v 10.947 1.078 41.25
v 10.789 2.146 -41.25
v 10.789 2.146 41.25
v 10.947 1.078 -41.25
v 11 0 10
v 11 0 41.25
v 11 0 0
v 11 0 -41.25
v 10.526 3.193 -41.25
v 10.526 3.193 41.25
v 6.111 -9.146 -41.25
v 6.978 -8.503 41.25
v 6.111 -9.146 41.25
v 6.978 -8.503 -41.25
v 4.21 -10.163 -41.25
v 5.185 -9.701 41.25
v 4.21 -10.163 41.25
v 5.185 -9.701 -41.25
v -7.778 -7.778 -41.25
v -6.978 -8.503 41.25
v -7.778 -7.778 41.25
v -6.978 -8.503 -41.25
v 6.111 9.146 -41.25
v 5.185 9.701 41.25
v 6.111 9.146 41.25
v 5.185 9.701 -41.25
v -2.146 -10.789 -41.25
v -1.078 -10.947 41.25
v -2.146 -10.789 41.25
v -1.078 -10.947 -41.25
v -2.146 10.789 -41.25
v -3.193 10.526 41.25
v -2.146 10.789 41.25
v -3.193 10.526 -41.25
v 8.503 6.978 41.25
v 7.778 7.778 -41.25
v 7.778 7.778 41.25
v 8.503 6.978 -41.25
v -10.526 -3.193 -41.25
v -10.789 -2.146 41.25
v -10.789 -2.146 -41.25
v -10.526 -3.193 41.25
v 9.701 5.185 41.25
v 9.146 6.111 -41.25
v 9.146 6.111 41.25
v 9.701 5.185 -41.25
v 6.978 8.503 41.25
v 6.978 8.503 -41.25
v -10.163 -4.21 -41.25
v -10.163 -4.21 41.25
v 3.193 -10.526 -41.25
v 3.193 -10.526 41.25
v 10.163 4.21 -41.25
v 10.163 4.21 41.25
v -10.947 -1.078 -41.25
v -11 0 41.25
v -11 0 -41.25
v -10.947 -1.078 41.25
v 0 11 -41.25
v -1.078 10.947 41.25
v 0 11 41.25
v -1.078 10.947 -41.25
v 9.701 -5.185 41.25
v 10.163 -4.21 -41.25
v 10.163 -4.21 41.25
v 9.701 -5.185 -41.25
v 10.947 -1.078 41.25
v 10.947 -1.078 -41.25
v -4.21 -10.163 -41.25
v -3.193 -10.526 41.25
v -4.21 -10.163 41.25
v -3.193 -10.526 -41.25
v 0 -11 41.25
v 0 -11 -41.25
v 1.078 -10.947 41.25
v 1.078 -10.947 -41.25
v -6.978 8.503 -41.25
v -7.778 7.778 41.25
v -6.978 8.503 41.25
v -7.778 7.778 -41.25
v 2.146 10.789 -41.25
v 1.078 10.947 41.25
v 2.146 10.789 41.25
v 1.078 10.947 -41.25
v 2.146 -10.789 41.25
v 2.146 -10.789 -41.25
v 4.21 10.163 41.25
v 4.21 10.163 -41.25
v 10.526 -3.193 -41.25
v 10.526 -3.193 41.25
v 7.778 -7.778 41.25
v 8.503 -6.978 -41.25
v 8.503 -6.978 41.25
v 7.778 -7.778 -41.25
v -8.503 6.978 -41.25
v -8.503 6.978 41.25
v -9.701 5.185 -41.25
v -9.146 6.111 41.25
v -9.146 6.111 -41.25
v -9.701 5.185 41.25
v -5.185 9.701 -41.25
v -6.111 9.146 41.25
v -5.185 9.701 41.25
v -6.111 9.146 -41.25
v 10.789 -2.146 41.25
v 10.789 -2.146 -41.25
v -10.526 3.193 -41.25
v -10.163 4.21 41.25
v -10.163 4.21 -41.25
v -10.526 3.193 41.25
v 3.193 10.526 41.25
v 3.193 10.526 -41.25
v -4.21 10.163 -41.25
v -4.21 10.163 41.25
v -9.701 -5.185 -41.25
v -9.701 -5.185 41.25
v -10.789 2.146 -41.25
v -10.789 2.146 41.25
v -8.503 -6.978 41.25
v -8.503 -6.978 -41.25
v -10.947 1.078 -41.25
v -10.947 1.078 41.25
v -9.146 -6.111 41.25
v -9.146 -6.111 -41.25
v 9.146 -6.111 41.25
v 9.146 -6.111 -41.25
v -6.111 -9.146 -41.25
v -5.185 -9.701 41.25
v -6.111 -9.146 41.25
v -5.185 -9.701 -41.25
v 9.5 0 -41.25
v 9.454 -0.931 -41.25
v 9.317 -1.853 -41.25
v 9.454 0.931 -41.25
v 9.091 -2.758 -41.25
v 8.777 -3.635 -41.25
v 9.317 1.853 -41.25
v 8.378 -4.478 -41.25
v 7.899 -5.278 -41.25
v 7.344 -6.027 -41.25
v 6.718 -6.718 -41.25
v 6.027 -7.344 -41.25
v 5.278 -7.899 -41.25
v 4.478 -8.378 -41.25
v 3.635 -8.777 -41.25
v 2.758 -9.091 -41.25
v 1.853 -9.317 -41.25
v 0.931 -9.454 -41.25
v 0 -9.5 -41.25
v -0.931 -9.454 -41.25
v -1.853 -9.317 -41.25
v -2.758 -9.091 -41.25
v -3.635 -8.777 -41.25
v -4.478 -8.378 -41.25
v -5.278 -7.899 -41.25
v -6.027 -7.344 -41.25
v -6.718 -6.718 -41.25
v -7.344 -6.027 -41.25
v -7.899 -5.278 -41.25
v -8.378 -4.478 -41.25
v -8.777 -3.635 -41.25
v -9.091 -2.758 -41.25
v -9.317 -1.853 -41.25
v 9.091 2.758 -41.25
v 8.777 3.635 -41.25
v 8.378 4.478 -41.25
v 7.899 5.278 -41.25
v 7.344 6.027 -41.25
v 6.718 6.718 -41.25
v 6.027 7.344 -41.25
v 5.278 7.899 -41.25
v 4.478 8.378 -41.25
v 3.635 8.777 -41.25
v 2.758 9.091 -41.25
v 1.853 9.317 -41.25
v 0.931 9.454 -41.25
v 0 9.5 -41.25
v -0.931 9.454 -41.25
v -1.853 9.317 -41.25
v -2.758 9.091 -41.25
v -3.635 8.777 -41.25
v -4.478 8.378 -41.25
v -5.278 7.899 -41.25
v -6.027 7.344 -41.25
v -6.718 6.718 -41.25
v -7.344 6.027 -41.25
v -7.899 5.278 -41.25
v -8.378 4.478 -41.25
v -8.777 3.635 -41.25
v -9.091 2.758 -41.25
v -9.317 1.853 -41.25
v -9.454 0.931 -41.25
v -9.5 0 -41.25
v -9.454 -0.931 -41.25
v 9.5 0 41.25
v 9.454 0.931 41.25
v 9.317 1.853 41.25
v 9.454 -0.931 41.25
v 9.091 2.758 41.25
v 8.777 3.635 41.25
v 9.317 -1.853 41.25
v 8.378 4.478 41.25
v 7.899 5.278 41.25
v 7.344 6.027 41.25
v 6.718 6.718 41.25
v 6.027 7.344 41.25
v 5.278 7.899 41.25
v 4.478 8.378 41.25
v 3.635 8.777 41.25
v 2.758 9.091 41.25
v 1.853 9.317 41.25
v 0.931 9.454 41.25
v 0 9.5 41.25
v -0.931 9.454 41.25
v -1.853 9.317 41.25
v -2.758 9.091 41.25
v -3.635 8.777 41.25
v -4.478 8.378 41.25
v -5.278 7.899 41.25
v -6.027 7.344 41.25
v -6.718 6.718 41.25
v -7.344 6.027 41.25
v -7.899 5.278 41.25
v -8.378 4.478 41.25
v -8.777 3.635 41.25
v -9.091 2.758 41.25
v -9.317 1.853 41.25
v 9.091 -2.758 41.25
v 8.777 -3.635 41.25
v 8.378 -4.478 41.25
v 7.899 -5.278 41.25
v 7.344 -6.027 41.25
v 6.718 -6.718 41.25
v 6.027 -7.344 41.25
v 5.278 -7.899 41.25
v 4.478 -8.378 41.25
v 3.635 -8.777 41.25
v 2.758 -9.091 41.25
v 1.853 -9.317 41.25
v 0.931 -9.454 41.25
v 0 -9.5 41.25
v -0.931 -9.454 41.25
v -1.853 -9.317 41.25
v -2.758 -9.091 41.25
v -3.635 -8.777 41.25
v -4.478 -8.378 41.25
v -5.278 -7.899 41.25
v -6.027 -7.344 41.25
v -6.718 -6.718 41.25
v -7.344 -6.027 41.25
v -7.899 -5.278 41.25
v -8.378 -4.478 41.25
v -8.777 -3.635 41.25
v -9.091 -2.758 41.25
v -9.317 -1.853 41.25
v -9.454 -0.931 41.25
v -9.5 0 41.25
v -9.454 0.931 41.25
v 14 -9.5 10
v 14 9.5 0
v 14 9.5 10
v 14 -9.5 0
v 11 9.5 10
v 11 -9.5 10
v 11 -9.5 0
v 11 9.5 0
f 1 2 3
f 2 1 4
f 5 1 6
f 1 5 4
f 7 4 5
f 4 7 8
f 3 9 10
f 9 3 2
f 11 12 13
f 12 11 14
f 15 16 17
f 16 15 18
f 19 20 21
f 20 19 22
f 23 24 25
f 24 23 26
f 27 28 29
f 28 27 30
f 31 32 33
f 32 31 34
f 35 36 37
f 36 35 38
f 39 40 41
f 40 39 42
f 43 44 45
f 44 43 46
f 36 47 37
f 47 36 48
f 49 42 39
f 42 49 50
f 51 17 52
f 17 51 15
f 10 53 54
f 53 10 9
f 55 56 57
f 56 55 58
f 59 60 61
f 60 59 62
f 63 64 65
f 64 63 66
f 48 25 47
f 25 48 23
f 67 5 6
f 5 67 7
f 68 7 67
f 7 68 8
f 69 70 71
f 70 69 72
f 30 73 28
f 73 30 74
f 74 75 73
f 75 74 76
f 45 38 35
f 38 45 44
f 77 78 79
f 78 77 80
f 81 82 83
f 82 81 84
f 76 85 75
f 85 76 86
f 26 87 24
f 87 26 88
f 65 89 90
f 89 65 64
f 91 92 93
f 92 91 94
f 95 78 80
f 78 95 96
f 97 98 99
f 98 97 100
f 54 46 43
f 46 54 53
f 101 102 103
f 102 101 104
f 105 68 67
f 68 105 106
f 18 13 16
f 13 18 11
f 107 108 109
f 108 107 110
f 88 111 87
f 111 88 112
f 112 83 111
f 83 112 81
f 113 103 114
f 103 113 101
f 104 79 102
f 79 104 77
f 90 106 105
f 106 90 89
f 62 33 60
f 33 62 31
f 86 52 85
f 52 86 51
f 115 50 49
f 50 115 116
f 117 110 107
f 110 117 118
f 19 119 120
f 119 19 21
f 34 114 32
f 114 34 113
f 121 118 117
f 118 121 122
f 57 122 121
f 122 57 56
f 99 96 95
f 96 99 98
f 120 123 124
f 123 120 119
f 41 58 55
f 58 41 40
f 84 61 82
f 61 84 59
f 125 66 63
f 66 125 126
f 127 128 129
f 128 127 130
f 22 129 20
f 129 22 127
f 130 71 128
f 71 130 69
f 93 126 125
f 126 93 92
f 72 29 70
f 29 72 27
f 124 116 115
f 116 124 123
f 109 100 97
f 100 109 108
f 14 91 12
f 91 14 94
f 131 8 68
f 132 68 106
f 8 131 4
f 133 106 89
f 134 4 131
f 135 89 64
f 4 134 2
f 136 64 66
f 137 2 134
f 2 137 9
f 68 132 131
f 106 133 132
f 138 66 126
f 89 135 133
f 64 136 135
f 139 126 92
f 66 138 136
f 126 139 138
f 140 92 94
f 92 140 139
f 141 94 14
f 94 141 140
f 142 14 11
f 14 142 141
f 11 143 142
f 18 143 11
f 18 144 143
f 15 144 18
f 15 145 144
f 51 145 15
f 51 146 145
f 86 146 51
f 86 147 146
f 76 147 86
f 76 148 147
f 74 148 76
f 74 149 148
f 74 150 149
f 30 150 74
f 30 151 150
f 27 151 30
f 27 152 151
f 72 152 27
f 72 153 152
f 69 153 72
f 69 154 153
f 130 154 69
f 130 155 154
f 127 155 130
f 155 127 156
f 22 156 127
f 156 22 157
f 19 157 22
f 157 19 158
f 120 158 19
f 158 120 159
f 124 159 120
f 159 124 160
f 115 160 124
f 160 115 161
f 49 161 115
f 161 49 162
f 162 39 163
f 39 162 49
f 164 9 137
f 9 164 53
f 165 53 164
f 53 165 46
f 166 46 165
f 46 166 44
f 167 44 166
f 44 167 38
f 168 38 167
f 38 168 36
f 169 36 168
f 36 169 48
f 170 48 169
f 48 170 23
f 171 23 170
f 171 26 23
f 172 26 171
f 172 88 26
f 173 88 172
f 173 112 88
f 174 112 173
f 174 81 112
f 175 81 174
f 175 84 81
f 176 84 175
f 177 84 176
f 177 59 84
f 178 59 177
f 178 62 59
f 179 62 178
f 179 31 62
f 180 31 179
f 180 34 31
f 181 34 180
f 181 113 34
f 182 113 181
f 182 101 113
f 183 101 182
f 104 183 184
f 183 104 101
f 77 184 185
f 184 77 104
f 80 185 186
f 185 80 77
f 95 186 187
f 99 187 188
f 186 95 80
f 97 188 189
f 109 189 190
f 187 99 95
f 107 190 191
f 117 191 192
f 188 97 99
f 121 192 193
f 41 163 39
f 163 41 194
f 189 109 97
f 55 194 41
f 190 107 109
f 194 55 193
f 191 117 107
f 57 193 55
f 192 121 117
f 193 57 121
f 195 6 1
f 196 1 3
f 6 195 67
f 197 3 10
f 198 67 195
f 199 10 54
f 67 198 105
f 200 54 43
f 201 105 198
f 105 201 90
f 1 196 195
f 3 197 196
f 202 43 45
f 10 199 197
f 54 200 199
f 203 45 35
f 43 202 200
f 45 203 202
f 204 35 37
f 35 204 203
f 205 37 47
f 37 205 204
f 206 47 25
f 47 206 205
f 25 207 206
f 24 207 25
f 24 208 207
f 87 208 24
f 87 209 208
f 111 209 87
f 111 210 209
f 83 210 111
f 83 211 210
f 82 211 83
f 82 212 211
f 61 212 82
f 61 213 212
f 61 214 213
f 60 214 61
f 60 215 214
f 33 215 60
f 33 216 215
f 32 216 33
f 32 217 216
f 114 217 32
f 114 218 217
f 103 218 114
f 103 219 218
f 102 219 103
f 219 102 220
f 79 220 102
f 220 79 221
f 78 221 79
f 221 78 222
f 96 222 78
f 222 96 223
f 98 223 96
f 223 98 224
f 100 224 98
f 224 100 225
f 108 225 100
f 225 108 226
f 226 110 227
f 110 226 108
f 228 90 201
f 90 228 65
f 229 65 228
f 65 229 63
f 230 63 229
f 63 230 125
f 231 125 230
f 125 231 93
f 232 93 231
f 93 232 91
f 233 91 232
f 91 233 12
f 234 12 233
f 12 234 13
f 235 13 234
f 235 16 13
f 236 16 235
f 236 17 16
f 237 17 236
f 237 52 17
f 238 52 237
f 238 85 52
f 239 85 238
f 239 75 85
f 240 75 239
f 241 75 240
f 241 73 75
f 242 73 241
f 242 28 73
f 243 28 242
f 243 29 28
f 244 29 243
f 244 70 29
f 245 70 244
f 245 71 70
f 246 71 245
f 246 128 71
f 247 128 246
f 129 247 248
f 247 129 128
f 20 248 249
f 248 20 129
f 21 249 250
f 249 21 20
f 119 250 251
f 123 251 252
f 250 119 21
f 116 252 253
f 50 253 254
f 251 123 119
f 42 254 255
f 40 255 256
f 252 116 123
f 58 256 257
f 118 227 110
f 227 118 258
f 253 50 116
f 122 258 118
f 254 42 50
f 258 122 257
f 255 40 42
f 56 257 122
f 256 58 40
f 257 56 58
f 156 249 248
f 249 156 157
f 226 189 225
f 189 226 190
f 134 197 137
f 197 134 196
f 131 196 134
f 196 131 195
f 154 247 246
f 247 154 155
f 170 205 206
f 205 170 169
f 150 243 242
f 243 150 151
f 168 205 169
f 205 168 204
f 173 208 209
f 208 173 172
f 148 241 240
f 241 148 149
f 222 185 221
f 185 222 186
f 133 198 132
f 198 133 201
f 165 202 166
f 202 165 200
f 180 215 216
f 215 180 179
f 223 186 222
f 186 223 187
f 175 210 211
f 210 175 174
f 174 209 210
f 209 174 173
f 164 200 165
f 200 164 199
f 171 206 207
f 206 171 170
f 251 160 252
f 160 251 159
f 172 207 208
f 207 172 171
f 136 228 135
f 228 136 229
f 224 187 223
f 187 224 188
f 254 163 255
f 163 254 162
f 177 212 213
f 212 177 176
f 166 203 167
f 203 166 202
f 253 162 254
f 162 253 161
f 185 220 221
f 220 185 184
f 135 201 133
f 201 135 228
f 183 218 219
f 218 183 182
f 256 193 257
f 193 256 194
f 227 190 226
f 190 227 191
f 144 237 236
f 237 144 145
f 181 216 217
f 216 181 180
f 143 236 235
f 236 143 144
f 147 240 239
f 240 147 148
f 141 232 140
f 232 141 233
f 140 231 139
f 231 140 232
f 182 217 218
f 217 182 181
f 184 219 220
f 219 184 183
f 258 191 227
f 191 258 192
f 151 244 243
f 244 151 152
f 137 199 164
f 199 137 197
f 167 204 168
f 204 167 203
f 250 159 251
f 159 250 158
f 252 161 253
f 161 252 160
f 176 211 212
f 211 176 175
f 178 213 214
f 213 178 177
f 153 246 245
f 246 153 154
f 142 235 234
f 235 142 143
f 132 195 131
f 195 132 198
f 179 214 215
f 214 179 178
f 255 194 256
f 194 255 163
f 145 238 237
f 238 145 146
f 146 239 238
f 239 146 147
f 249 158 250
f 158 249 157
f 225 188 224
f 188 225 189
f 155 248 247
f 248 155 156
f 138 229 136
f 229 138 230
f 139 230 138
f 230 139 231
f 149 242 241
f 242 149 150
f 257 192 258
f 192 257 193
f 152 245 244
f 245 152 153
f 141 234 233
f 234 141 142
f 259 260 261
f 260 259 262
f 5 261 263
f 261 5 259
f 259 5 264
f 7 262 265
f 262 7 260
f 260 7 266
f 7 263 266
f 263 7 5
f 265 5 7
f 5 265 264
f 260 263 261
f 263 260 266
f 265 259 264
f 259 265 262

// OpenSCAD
module hollow_cylindrical_ring() {
    difference() {
        // Outer cylinder
        cylinder(h=82.5, r=11, $fn=64);
        // Inner cylinder (bore)
        translate([0, 0, -1])
            cylinder(h=84.5, r=9.5, $fn=64);
    }
}

module rectangular_lug() {
    translate([11, -9.5, 41.25])
        cube([3, 19, 10], center=false);
}

translate([0, 0, -41.25])
    union() {
        hollow_cylindrical_ring();
        rectangular_lug();
    }
